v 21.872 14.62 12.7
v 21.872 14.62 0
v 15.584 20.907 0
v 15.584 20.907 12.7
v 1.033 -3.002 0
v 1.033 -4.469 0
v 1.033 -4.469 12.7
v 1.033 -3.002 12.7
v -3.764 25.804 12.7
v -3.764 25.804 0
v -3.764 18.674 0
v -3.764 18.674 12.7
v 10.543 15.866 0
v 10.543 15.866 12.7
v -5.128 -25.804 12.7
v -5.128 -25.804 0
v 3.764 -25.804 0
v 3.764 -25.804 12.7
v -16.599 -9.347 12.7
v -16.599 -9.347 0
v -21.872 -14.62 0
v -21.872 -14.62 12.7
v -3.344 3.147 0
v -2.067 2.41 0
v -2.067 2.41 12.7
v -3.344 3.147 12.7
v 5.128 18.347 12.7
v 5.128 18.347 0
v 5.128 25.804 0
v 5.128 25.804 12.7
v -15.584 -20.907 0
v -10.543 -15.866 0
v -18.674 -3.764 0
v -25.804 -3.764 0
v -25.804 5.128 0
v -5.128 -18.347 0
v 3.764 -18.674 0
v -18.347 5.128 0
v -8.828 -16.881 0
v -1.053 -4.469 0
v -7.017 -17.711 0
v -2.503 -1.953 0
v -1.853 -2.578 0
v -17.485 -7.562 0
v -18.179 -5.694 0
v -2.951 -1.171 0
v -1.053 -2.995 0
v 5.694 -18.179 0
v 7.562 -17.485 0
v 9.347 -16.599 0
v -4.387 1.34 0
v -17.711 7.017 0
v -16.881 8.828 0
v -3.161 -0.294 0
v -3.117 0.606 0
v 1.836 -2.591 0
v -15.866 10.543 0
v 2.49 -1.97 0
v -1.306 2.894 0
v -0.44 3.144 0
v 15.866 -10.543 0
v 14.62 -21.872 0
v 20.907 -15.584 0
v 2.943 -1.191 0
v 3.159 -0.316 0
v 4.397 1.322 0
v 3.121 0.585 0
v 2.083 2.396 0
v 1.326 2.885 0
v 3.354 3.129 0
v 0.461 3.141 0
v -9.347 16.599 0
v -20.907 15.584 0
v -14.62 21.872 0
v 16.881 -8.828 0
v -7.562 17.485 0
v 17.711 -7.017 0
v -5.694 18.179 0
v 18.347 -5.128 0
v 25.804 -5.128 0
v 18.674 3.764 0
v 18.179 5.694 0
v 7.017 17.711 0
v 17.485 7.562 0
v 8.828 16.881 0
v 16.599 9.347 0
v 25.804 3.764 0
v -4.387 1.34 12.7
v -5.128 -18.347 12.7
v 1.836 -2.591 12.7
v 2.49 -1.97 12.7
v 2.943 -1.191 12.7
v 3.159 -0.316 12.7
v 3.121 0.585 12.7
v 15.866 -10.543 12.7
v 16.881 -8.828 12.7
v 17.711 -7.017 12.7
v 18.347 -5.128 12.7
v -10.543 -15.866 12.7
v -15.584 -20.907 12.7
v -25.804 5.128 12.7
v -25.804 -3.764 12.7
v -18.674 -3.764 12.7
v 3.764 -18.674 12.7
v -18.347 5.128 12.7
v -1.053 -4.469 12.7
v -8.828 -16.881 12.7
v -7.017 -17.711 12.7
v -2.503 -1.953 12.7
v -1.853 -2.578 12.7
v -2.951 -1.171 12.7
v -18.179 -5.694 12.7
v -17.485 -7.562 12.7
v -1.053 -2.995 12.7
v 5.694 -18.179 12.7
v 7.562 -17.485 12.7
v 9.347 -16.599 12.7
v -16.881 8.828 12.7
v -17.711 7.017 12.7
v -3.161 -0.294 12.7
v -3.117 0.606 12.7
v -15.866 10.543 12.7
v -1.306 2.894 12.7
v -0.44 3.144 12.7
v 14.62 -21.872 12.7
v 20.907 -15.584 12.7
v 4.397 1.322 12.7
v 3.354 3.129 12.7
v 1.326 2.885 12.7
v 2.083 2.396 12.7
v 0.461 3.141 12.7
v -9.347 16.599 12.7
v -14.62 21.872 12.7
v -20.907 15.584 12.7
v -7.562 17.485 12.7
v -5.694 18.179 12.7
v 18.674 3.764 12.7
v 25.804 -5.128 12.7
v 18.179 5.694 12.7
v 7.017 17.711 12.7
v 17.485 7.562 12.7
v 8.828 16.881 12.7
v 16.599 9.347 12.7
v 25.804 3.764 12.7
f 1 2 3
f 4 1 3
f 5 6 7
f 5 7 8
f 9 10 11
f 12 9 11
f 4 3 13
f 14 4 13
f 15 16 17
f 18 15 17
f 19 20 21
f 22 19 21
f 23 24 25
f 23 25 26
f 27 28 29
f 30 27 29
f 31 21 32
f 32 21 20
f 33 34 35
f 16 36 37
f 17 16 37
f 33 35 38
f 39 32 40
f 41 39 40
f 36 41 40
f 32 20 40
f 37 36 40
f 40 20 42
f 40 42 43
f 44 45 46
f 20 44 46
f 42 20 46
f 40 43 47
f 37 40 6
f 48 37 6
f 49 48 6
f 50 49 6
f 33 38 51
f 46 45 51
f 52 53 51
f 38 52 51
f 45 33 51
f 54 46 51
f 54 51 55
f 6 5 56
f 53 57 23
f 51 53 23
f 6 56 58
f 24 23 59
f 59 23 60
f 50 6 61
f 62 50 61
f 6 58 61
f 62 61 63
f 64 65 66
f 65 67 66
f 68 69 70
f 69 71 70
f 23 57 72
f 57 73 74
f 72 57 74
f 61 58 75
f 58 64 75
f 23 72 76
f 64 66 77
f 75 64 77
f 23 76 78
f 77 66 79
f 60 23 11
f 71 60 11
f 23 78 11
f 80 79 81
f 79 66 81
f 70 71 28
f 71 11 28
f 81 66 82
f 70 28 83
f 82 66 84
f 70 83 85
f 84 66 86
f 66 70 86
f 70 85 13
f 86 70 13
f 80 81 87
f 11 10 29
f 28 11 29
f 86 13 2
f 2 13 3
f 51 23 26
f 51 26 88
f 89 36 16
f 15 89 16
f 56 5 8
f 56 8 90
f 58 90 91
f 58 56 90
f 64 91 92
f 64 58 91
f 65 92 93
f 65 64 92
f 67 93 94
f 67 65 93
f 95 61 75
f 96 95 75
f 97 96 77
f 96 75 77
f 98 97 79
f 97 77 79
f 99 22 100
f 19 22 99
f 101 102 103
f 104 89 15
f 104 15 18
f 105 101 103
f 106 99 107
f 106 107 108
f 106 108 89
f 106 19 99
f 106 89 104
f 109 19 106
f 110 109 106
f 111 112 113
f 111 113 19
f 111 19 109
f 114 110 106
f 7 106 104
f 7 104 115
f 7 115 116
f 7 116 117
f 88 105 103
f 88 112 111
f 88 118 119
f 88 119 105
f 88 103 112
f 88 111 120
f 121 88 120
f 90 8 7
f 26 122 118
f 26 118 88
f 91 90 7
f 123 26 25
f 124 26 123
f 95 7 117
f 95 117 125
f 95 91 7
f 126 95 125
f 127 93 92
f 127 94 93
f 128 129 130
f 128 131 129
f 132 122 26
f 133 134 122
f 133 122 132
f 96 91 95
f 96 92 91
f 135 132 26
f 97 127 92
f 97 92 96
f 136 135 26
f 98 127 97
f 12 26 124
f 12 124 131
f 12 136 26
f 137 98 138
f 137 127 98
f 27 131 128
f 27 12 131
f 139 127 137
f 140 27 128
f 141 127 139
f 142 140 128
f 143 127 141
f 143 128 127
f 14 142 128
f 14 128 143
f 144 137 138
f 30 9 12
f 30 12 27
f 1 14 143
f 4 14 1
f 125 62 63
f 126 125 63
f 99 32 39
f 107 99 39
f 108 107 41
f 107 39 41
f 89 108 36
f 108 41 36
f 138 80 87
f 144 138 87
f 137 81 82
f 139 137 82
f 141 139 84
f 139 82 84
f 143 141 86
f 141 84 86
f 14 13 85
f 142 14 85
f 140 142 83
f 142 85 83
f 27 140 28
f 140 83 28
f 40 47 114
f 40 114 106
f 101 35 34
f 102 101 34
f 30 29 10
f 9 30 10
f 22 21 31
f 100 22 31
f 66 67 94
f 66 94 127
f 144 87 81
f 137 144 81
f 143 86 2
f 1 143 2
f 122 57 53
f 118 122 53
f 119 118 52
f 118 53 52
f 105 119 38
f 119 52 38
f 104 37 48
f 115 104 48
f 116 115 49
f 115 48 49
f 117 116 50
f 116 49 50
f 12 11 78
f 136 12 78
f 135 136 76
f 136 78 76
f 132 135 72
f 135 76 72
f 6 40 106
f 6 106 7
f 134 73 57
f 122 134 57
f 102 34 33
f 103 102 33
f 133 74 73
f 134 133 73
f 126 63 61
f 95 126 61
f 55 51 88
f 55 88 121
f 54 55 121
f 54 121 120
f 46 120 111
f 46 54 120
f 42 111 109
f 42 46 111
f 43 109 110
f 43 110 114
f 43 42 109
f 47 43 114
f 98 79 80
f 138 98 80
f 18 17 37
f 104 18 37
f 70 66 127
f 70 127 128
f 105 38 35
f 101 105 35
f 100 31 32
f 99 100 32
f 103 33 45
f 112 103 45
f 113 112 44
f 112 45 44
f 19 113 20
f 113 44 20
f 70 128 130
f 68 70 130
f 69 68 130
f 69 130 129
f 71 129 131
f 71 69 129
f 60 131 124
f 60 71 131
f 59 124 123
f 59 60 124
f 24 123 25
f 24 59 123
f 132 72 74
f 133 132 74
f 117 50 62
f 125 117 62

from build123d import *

# Parameters (mm, degrees)
EXTRUSION2_DEPTH = 12.7


with BuildPart() as part:
    # Sketch1 → Extrusion2 (new body)
    with BuildSketch(Plane.XY):
        with BuildLine():
            Line((15.584253212, 20.907446686), (10.543218779, 15.866412253))
            ThreePointArc((10.543218779, 15.866412253), (7.93326935, 17.319518972), (5.128249951, 18.346758636))
            Line((5.128249951, 18.346758636), (5.128249951, 25.803528454))
            Line((5.128249951, 25.803528454), (-3.764066203, 25.803528454))
            Line((-3.764066203, 25.803528454), (-3.764066203, 18.674429191))
            ThreePointArc((-3.764066203, 18.674429191), (-6.637080757, 17.856417866), (-9.346897128, 16.59933776))
            Line((-9.346897128, 16.59933776), (-14.619629632, 21.872070265))
            Line((-14.619629632, 21.872070265), (-20.907446686, 15.584253212))
            Line((-20.907446686, 15.584253212), (-15.866412253, 10.543218779))
            ThreePointArc((-15.866412253, 10.543218779), (-17.319518972, 7.93326935), (-18.346758636, 5.128249951))
            Line((-18.346758636, 5.128249951), (-25.803528454, 5.128249951))
            Line((-25.803528454, 5.128249951), (-25.803528454, -3.764066203))
            Line((-25.803528454, -3.764066203), (-18.674429191, -3.764066203))
            ThreePointArc((-18.674429191, -3.764066203), (-17.856417866, -6.637080757), (-16.59933776, -9.346897128))
            Line((-16.59933776, -9.346897128), (-21.872070265, -14.619629632))
            Line((-21.872070265, -14.619629632), (-15.584253212, -20.907446686))
            Line((-15.584253212, -20.907446686), (-10.543218779, -15.866412253))
            ThreePointArc((-10.543218779, -15.866412253), (-7.93326935, -17.319518972), (-5.128249951, -18.346758636))
            Line((-5.128249951, -18.346758636), (-5.128249951, -25.803528454))
            Line((-5.128249951, -25.803528454), (3.764066203, -25.803528454))
            Line((3.764066203, -25.803528454), (3.764066203, -18.674429191))
            ThreePointArc((3.764066203, -18.674429191), (6.637080757, -17.856417866), (9.346897128, -16.59933776))
            Line((9.346897128, -16.59933776), (14.619629632, -21.872070265))
            Line((14.619629632, -21.872070265), (20.907446686, -15.584253212))
            Line((20.907446686, -15.584253212), (15.866412253, -10.543218779))
            ThreePointArc((15.866412253, -10.543218779), (17.319518972, -7.93326935), (18.346758636, -5.128249951))
            Line((18.346758636, -5.128249951), (25.803528454, -5.128249951))
            Line((25.803528454, -5.128249951), (25.803528454, 3.764066203))
            Line((25.803528454, 3.764066203), (18.674429191, 3.764066203))
            ThreePointArc((18.674429191, 3.764066203), (17.856417866, 6.637080757), (16.59933776, 9.346897128))
            Line((16.59933776, 9.346897128), (21.872070265, 14.619629632))
            Line((21.872070265, 14.619629632), (15.584253212, 20.907446686))
        make_face()
        with BuildLine():
            ThreePointArc((-3.116590945, 0.606206137), (-2.754939335, -1.578269388), (-1.053419361, -2.995151524))
            Line((-1.053419361, -2.995151524), (-1.053419361, -4.468974981))
            Line((-1.053419361, -4.468974981), (1.033305558, -4.468974981))
            Line((1.033305558, -4.468974981), (1.033305558, -3.00215))
            ThreePointArc((1.033305558, -3.00215), (2.744291052, -1.596712756), (3.120586988, 0.585287835))
            Line((3.120586988, 0.585287835), (4.396955543, 1.322199563))
            Line((4.396955543, 1.322199563), (3.353593084, 3.129356353))
            Line((3.353593084, 3.129356353), (2.083285387, 2.395943863))
            ThreePointArc((2.083285387, 2.395943863), (0.010648283, 3.174982144), (-2.067167627, 2.409863689))
            Line((-2.067167627, 2.409863689), (-3.343536182, 3.146775418))
            Line((-3.343536182, 3.146775418), (-4.386898641, 1.339618628))
            Line((-4.386898641, 1.339618628), (-3.116590945, 0.606206137))
        make_face(mode=Mode.SUBTRACT)
    extrude(amount=EXTRUSION2_DEPTH)


solid = part.part
